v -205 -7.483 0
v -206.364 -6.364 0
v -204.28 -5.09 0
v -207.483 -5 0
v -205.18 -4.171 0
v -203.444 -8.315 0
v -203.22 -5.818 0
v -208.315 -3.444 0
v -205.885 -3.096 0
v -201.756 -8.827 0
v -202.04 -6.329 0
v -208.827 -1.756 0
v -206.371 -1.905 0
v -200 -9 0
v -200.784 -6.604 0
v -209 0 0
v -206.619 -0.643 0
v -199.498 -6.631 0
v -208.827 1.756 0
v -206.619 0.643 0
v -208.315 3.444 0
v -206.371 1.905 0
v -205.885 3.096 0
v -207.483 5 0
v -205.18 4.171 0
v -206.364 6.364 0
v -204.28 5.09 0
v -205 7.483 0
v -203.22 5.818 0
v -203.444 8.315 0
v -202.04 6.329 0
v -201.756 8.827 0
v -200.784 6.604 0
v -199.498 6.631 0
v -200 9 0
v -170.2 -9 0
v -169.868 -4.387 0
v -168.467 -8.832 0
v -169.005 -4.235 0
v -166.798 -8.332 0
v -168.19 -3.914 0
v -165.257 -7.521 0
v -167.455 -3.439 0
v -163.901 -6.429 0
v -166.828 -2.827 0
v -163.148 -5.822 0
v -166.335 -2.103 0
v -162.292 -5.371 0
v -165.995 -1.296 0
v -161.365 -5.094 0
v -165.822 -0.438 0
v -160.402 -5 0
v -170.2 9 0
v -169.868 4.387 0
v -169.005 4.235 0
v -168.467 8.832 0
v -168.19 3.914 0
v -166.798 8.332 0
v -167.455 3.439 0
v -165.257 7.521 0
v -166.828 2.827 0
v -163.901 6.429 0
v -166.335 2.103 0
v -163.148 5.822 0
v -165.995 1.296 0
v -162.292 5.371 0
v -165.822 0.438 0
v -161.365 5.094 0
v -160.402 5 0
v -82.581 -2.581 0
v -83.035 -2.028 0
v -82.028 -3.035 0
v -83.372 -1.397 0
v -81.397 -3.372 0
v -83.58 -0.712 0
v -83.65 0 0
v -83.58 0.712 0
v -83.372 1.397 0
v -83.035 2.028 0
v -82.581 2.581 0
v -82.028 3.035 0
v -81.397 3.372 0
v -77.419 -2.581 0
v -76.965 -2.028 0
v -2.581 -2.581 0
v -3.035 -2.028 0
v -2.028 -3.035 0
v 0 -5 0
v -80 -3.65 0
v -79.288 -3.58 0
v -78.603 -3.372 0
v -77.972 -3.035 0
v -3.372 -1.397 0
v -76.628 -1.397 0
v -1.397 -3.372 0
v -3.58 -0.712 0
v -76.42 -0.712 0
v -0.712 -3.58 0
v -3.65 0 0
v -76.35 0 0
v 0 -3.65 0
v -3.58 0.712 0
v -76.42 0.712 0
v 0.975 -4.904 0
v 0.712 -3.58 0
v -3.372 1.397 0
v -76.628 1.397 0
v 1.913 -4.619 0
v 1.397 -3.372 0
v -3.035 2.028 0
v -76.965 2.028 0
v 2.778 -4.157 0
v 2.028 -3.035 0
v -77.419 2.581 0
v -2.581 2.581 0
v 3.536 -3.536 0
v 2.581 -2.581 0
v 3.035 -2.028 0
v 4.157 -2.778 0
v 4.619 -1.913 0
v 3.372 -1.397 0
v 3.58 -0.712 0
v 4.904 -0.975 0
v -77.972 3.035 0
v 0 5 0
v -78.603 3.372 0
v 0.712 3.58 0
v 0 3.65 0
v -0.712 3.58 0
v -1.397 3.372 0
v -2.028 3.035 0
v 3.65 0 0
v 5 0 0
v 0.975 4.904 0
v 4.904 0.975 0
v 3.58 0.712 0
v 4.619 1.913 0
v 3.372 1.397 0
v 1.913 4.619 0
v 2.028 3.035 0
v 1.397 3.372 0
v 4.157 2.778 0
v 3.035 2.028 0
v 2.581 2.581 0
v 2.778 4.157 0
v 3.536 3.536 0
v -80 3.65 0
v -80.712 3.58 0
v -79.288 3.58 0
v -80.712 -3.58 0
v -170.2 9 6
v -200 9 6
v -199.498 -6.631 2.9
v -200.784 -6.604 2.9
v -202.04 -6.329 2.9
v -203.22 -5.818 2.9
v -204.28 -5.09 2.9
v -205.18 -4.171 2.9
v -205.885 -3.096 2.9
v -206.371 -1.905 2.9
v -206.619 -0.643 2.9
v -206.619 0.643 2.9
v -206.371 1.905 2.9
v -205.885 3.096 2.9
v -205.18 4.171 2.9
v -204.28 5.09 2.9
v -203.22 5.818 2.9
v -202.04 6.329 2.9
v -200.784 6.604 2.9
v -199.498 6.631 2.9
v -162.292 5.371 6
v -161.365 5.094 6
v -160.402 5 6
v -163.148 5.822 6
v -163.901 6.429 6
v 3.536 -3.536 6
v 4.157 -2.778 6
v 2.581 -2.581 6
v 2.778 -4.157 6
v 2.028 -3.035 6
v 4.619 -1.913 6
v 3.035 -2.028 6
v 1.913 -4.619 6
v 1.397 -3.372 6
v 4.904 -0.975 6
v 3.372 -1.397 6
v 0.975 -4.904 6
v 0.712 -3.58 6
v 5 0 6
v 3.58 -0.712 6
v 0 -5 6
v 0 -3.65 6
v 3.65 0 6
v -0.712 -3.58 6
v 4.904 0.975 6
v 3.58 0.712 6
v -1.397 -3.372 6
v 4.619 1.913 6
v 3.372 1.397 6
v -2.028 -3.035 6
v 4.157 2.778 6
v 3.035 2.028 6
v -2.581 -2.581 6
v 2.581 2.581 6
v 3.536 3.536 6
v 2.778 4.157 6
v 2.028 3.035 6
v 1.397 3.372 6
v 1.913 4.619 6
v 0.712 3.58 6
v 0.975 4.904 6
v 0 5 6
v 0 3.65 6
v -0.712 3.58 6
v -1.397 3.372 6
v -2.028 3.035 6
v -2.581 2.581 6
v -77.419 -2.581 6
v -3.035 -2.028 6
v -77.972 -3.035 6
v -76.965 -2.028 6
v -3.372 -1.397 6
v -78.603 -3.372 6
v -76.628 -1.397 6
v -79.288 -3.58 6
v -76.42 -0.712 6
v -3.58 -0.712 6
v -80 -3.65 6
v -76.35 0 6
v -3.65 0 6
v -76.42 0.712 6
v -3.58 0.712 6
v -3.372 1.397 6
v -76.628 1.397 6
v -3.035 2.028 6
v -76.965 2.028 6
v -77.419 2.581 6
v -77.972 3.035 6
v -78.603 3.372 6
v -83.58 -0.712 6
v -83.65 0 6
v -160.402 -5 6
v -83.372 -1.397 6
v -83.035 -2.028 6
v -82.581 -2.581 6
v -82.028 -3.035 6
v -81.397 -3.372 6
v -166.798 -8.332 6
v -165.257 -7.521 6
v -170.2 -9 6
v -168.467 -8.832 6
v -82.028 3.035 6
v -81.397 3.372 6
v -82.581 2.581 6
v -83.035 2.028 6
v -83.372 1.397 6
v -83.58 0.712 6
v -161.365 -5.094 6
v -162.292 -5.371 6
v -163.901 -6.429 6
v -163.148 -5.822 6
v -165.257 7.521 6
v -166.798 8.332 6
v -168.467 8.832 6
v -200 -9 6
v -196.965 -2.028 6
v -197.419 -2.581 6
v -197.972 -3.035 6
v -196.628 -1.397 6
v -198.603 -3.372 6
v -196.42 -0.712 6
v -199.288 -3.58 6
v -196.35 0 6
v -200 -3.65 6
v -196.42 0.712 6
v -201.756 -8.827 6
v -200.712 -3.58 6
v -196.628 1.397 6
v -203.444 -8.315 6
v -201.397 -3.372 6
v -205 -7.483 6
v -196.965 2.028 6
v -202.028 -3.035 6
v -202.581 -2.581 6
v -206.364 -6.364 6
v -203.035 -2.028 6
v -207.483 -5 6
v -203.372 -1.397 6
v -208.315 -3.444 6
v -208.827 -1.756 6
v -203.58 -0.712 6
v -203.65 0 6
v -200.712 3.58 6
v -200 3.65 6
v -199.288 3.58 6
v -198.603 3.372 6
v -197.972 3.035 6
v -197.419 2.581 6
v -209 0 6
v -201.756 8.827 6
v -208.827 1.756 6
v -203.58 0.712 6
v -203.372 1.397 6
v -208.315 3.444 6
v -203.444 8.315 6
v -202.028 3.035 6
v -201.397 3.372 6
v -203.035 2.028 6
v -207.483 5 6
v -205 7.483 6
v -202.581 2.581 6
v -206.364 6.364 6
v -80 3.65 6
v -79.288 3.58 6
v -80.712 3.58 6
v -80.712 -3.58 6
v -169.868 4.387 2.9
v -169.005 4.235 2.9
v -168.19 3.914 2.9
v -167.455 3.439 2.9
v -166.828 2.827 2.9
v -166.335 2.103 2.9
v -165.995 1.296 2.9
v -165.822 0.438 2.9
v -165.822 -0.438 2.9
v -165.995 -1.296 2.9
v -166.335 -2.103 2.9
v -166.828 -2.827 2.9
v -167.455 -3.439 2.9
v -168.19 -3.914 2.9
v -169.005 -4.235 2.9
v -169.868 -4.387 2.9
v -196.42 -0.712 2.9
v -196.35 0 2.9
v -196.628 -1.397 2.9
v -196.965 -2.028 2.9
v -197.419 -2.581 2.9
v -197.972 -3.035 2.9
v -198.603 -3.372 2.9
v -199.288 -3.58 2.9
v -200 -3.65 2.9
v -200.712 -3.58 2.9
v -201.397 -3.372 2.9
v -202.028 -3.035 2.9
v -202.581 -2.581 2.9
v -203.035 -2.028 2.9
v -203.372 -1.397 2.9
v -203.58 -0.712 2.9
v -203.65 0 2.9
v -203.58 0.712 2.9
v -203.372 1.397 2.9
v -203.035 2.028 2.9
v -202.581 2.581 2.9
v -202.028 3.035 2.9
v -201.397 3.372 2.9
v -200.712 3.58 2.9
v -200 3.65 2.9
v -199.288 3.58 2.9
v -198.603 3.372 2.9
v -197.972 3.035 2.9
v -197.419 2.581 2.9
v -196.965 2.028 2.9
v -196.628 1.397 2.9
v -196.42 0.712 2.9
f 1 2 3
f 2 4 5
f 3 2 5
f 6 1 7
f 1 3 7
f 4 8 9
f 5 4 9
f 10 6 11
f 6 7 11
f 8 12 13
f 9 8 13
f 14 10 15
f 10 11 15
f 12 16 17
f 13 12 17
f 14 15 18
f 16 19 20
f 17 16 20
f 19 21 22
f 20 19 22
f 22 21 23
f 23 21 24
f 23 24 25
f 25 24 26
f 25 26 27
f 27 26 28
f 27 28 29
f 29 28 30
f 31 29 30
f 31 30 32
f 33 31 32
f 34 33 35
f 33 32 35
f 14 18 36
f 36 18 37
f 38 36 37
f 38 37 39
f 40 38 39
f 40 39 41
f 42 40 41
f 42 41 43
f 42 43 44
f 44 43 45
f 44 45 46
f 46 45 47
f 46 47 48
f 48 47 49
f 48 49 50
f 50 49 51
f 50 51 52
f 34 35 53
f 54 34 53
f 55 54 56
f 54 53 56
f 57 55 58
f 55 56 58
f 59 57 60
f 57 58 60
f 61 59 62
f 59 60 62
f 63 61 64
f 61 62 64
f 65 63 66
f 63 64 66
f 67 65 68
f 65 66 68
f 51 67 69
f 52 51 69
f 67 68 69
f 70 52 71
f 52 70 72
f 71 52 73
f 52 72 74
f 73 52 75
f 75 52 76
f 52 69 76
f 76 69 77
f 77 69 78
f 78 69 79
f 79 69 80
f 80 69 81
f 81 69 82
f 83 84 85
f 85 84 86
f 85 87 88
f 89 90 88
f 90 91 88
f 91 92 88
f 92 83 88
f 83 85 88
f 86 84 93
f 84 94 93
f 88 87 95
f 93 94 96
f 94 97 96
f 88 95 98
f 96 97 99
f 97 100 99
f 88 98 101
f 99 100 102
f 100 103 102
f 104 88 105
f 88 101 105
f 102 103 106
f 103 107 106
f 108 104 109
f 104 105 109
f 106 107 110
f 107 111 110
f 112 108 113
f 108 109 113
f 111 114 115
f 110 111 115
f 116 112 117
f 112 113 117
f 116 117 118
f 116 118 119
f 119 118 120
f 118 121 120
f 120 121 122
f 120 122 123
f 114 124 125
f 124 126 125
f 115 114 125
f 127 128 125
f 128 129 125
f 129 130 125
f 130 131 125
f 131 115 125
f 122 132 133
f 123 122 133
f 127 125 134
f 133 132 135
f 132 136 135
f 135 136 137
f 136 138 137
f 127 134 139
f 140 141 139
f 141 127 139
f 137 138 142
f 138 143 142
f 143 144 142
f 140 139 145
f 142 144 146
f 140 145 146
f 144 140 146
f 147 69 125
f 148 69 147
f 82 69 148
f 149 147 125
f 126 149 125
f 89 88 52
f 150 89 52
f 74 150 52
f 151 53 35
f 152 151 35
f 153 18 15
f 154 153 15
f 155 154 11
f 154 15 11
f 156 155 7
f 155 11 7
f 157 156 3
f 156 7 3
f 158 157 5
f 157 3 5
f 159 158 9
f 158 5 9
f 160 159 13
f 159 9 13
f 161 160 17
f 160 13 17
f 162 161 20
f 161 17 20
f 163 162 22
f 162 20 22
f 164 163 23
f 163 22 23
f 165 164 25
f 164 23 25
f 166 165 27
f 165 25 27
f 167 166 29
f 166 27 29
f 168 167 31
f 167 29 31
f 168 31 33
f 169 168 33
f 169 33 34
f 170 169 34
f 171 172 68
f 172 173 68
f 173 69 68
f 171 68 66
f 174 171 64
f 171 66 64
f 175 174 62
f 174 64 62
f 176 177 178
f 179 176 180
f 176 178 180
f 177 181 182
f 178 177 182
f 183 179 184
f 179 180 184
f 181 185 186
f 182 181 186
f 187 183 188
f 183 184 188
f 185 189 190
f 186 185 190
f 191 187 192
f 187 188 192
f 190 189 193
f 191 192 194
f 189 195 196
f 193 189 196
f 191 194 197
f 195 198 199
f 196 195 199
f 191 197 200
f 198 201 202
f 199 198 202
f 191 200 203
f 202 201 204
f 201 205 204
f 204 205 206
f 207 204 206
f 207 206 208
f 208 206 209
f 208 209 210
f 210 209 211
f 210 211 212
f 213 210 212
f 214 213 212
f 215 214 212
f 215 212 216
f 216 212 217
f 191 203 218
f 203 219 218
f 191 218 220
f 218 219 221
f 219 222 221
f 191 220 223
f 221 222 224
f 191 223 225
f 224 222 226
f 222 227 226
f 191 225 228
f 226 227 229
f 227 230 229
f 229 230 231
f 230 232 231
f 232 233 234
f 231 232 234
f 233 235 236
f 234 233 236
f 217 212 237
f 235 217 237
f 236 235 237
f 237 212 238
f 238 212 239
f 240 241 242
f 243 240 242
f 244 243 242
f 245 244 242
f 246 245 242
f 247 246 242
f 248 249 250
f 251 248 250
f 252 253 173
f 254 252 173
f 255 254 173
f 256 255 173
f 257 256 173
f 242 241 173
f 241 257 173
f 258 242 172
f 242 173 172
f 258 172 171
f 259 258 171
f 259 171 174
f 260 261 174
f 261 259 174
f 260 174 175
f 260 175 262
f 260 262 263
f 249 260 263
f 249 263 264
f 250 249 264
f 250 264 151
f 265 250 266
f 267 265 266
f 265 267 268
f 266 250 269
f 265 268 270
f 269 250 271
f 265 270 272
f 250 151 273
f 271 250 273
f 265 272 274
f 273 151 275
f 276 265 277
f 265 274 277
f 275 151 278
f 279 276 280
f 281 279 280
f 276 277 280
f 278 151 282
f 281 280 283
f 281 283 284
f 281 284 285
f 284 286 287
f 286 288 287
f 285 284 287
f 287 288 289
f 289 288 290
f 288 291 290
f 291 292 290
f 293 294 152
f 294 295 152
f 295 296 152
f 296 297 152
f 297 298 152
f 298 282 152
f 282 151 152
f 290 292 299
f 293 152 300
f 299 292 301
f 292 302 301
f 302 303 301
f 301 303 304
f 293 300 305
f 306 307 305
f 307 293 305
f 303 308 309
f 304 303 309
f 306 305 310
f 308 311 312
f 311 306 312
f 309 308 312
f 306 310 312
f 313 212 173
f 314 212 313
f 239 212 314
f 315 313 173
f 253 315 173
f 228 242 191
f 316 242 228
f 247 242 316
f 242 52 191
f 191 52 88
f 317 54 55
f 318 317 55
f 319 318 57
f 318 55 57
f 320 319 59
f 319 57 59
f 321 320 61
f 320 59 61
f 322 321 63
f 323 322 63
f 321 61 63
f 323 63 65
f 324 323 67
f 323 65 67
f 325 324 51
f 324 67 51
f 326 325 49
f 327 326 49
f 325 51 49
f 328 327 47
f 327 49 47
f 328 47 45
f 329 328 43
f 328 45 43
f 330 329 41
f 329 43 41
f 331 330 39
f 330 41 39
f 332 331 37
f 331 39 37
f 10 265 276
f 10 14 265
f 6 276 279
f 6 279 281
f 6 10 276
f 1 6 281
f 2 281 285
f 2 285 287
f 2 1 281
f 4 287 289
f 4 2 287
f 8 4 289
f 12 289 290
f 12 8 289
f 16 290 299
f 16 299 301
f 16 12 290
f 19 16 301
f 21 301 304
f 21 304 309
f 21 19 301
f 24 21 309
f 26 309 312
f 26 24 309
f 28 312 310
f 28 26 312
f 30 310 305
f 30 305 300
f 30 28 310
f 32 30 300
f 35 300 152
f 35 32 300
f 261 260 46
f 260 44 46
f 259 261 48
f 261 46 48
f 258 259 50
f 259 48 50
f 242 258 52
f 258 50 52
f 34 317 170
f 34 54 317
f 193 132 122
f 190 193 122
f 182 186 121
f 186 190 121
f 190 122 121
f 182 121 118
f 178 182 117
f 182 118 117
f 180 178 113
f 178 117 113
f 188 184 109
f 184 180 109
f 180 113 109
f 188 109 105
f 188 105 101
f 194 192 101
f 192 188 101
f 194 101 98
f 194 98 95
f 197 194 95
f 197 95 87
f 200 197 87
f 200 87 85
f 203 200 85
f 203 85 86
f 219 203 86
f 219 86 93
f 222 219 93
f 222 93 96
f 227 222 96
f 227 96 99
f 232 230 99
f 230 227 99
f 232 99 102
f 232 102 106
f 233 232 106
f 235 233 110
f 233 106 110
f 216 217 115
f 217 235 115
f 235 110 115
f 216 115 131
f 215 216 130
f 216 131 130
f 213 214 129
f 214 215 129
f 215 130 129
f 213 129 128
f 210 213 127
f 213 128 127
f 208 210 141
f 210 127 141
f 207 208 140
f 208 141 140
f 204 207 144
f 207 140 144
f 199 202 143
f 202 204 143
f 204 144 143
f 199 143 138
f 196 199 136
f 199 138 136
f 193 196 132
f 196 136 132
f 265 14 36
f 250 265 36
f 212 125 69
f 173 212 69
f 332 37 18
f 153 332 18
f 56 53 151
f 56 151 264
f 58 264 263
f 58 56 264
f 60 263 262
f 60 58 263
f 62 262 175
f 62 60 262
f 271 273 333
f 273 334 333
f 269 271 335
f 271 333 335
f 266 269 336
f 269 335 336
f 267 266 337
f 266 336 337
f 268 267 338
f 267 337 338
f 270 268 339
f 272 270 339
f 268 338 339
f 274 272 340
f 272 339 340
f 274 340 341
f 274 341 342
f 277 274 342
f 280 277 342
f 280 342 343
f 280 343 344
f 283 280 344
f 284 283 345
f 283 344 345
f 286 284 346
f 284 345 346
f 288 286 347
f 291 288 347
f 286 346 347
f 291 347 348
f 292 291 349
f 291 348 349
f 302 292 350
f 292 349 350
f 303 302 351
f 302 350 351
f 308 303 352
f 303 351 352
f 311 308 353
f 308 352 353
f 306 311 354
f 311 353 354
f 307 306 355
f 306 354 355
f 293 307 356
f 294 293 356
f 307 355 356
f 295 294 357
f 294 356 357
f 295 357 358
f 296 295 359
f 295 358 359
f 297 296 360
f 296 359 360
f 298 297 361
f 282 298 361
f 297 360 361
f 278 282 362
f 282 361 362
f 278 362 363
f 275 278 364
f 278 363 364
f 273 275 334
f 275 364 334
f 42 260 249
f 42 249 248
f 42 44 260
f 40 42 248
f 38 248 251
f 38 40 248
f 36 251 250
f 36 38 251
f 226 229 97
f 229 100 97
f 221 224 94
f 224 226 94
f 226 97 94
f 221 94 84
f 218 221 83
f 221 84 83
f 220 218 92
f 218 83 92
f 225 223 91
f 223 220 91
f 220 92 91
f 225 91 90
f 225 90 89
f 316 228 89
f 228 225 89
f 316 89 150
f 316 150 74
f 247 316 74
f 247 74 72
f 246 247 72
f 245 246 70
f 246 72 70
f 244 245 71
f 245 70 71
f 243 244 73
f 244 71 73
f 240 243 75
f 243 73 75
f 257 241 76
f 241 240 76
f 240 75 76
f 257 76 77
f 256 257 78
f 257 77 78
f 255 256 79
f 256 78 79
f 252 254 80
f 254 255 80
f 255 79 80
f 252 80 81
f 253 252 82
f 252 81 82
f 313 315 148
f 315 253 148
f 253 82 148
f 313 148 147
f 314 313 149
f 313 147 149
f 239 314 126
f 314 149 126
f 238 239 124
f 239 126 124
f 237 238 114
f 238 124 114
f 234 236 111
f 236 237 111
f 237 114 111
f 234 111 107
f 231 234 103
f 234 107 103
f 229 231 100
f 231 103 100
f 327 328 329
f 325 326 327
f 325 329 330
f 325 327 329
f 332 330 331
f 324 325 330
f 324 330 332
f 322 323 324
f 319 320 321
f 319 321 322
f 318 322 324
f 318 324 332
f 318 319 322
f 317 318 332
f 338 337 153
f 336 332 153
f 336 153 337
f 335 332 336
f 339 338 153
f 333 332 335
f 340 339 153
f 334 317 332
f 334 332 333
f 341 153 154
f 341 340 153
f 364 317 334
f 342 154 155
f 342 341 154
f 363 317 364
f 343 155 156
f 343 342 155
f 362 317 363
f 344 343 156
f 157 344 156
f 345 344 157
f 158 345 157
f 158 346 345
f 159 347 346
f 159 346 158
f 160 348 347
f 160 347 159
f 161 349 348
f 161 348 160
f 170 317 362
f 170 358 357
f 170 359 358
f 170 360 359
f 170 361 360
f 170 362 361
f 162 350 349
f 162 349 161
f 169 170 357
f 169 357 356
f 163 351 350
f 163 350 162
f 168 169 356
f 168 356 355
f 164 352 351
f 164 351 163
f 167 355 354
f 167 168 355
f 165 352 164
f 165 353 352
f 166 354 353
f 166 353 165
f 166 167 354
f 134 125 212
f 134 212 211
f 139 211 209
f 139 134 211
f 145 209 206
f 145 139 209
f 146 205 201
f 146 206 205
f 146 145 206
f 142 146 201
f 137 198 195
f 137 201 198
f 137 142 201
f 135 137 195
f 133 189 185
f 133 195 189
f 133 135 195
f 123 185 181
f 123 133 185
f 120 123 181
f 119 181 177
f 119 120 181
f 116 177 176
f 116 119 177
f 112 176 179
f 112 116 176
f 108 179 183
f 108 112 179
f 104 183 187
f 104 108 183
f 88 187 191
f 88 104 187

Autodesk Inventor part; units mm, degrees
ref_plane "YZ Plane" through (0, 0, 0) normal (1, 0, 0) x (0, 1, 0)
ref_plane "XZ Plane" through (0, 0, 0) normal (0, 1, 0) x (-1, 0, 0)
ref_plane "XY Plane" through (0, 0, 0) normal (0, 0, 1) x (1, 0, 0)
sketch "草圖1" plane through (0, 0, 0) normal (0, 0, 1) x (1, 0, 0)
  line L0 (-200, 0) -> (0, 0) construction
  line L1 (-200, -5) -> (0, -5)
  line L2 (0, 5) -> (-200, 5)
  arc A0 (-200, 5) -> (-200, -5) centre (-200, 0) ccw
  arc A1 (0, -5) -> (0, 5) centre (0, 0) ccw
  circle A2 centre (0, 0) radius 3.65
  circle A3 centre (-80, 0) radius 3.65
  circle A4 centre (-200, 0) radius 3.65
  point P0 (-100, 0)
  dimension "d0" = 200
  dimension "d1" = 10
  dimension "d3" = 7.3
  dimension "d27" = 7.3
  dimension "d47" = 7.3
extrude "擠出1" add sketch "草圖1" along normal blind 6 contours A0 L2 A1 L1 | A4
sketch "草圖4" plane through (0, 0, 0) normal (0, 0, -1) x (-1, 0, 0)
  line L0 (200, 0) -> (170.2, 0) construction
  line L1 (200, -9) -> (170.2, -9)
  line L2 (170.2, 9) -> (200, 9)
  arc A0 (200, -9) -> (200, 9) centre (200, 0) ccw
  arc A1 (170.2, 9) -> (170.2, -9) centre (170.2, 0) ccw
  arc A2 (200, -5) -> (200, 5) centre (200, 0) ccw projected
  circle A3 centre (170.2, 0) radius 0.6
  circle A4 centre (170.2, 0) radius 4.4
  circle A5 centre (200, 0) radius 6.65
  line L3 (169.8678, 4.3874) -> (199.4979, 6.631)
  line L4 (169.8678, -4.3874) -> (199.4979, -6.631)
  point P0 (0, 0)
  point P1 (185.1, 0)
  dimension "d31" = 9
  dimension "d36" = 1.2
  dimension "d37" = 29.8
  dimension "d42" = 8.8
  dimension "d44" = 13.3
extrude "擠出5" add sketch "草圖4" against normal blind 6 contours L1 A1 L2 A0 | A3 | A4 | A4 L3 A5 L4 | A5
extrude "擠出6" cut sketch "草圖4" against normal blind 2.9 contours A3 | A4 | A4 L3 A5 L4 | A5
extrude "擠出7" cut sketch "草圖1" along normal through all contours A4
fillet "圓角1" radius 5 2 edges at (-162.7167, 5, 3) (-162.7167, -5, 3)
properties part number "200_forservo"
